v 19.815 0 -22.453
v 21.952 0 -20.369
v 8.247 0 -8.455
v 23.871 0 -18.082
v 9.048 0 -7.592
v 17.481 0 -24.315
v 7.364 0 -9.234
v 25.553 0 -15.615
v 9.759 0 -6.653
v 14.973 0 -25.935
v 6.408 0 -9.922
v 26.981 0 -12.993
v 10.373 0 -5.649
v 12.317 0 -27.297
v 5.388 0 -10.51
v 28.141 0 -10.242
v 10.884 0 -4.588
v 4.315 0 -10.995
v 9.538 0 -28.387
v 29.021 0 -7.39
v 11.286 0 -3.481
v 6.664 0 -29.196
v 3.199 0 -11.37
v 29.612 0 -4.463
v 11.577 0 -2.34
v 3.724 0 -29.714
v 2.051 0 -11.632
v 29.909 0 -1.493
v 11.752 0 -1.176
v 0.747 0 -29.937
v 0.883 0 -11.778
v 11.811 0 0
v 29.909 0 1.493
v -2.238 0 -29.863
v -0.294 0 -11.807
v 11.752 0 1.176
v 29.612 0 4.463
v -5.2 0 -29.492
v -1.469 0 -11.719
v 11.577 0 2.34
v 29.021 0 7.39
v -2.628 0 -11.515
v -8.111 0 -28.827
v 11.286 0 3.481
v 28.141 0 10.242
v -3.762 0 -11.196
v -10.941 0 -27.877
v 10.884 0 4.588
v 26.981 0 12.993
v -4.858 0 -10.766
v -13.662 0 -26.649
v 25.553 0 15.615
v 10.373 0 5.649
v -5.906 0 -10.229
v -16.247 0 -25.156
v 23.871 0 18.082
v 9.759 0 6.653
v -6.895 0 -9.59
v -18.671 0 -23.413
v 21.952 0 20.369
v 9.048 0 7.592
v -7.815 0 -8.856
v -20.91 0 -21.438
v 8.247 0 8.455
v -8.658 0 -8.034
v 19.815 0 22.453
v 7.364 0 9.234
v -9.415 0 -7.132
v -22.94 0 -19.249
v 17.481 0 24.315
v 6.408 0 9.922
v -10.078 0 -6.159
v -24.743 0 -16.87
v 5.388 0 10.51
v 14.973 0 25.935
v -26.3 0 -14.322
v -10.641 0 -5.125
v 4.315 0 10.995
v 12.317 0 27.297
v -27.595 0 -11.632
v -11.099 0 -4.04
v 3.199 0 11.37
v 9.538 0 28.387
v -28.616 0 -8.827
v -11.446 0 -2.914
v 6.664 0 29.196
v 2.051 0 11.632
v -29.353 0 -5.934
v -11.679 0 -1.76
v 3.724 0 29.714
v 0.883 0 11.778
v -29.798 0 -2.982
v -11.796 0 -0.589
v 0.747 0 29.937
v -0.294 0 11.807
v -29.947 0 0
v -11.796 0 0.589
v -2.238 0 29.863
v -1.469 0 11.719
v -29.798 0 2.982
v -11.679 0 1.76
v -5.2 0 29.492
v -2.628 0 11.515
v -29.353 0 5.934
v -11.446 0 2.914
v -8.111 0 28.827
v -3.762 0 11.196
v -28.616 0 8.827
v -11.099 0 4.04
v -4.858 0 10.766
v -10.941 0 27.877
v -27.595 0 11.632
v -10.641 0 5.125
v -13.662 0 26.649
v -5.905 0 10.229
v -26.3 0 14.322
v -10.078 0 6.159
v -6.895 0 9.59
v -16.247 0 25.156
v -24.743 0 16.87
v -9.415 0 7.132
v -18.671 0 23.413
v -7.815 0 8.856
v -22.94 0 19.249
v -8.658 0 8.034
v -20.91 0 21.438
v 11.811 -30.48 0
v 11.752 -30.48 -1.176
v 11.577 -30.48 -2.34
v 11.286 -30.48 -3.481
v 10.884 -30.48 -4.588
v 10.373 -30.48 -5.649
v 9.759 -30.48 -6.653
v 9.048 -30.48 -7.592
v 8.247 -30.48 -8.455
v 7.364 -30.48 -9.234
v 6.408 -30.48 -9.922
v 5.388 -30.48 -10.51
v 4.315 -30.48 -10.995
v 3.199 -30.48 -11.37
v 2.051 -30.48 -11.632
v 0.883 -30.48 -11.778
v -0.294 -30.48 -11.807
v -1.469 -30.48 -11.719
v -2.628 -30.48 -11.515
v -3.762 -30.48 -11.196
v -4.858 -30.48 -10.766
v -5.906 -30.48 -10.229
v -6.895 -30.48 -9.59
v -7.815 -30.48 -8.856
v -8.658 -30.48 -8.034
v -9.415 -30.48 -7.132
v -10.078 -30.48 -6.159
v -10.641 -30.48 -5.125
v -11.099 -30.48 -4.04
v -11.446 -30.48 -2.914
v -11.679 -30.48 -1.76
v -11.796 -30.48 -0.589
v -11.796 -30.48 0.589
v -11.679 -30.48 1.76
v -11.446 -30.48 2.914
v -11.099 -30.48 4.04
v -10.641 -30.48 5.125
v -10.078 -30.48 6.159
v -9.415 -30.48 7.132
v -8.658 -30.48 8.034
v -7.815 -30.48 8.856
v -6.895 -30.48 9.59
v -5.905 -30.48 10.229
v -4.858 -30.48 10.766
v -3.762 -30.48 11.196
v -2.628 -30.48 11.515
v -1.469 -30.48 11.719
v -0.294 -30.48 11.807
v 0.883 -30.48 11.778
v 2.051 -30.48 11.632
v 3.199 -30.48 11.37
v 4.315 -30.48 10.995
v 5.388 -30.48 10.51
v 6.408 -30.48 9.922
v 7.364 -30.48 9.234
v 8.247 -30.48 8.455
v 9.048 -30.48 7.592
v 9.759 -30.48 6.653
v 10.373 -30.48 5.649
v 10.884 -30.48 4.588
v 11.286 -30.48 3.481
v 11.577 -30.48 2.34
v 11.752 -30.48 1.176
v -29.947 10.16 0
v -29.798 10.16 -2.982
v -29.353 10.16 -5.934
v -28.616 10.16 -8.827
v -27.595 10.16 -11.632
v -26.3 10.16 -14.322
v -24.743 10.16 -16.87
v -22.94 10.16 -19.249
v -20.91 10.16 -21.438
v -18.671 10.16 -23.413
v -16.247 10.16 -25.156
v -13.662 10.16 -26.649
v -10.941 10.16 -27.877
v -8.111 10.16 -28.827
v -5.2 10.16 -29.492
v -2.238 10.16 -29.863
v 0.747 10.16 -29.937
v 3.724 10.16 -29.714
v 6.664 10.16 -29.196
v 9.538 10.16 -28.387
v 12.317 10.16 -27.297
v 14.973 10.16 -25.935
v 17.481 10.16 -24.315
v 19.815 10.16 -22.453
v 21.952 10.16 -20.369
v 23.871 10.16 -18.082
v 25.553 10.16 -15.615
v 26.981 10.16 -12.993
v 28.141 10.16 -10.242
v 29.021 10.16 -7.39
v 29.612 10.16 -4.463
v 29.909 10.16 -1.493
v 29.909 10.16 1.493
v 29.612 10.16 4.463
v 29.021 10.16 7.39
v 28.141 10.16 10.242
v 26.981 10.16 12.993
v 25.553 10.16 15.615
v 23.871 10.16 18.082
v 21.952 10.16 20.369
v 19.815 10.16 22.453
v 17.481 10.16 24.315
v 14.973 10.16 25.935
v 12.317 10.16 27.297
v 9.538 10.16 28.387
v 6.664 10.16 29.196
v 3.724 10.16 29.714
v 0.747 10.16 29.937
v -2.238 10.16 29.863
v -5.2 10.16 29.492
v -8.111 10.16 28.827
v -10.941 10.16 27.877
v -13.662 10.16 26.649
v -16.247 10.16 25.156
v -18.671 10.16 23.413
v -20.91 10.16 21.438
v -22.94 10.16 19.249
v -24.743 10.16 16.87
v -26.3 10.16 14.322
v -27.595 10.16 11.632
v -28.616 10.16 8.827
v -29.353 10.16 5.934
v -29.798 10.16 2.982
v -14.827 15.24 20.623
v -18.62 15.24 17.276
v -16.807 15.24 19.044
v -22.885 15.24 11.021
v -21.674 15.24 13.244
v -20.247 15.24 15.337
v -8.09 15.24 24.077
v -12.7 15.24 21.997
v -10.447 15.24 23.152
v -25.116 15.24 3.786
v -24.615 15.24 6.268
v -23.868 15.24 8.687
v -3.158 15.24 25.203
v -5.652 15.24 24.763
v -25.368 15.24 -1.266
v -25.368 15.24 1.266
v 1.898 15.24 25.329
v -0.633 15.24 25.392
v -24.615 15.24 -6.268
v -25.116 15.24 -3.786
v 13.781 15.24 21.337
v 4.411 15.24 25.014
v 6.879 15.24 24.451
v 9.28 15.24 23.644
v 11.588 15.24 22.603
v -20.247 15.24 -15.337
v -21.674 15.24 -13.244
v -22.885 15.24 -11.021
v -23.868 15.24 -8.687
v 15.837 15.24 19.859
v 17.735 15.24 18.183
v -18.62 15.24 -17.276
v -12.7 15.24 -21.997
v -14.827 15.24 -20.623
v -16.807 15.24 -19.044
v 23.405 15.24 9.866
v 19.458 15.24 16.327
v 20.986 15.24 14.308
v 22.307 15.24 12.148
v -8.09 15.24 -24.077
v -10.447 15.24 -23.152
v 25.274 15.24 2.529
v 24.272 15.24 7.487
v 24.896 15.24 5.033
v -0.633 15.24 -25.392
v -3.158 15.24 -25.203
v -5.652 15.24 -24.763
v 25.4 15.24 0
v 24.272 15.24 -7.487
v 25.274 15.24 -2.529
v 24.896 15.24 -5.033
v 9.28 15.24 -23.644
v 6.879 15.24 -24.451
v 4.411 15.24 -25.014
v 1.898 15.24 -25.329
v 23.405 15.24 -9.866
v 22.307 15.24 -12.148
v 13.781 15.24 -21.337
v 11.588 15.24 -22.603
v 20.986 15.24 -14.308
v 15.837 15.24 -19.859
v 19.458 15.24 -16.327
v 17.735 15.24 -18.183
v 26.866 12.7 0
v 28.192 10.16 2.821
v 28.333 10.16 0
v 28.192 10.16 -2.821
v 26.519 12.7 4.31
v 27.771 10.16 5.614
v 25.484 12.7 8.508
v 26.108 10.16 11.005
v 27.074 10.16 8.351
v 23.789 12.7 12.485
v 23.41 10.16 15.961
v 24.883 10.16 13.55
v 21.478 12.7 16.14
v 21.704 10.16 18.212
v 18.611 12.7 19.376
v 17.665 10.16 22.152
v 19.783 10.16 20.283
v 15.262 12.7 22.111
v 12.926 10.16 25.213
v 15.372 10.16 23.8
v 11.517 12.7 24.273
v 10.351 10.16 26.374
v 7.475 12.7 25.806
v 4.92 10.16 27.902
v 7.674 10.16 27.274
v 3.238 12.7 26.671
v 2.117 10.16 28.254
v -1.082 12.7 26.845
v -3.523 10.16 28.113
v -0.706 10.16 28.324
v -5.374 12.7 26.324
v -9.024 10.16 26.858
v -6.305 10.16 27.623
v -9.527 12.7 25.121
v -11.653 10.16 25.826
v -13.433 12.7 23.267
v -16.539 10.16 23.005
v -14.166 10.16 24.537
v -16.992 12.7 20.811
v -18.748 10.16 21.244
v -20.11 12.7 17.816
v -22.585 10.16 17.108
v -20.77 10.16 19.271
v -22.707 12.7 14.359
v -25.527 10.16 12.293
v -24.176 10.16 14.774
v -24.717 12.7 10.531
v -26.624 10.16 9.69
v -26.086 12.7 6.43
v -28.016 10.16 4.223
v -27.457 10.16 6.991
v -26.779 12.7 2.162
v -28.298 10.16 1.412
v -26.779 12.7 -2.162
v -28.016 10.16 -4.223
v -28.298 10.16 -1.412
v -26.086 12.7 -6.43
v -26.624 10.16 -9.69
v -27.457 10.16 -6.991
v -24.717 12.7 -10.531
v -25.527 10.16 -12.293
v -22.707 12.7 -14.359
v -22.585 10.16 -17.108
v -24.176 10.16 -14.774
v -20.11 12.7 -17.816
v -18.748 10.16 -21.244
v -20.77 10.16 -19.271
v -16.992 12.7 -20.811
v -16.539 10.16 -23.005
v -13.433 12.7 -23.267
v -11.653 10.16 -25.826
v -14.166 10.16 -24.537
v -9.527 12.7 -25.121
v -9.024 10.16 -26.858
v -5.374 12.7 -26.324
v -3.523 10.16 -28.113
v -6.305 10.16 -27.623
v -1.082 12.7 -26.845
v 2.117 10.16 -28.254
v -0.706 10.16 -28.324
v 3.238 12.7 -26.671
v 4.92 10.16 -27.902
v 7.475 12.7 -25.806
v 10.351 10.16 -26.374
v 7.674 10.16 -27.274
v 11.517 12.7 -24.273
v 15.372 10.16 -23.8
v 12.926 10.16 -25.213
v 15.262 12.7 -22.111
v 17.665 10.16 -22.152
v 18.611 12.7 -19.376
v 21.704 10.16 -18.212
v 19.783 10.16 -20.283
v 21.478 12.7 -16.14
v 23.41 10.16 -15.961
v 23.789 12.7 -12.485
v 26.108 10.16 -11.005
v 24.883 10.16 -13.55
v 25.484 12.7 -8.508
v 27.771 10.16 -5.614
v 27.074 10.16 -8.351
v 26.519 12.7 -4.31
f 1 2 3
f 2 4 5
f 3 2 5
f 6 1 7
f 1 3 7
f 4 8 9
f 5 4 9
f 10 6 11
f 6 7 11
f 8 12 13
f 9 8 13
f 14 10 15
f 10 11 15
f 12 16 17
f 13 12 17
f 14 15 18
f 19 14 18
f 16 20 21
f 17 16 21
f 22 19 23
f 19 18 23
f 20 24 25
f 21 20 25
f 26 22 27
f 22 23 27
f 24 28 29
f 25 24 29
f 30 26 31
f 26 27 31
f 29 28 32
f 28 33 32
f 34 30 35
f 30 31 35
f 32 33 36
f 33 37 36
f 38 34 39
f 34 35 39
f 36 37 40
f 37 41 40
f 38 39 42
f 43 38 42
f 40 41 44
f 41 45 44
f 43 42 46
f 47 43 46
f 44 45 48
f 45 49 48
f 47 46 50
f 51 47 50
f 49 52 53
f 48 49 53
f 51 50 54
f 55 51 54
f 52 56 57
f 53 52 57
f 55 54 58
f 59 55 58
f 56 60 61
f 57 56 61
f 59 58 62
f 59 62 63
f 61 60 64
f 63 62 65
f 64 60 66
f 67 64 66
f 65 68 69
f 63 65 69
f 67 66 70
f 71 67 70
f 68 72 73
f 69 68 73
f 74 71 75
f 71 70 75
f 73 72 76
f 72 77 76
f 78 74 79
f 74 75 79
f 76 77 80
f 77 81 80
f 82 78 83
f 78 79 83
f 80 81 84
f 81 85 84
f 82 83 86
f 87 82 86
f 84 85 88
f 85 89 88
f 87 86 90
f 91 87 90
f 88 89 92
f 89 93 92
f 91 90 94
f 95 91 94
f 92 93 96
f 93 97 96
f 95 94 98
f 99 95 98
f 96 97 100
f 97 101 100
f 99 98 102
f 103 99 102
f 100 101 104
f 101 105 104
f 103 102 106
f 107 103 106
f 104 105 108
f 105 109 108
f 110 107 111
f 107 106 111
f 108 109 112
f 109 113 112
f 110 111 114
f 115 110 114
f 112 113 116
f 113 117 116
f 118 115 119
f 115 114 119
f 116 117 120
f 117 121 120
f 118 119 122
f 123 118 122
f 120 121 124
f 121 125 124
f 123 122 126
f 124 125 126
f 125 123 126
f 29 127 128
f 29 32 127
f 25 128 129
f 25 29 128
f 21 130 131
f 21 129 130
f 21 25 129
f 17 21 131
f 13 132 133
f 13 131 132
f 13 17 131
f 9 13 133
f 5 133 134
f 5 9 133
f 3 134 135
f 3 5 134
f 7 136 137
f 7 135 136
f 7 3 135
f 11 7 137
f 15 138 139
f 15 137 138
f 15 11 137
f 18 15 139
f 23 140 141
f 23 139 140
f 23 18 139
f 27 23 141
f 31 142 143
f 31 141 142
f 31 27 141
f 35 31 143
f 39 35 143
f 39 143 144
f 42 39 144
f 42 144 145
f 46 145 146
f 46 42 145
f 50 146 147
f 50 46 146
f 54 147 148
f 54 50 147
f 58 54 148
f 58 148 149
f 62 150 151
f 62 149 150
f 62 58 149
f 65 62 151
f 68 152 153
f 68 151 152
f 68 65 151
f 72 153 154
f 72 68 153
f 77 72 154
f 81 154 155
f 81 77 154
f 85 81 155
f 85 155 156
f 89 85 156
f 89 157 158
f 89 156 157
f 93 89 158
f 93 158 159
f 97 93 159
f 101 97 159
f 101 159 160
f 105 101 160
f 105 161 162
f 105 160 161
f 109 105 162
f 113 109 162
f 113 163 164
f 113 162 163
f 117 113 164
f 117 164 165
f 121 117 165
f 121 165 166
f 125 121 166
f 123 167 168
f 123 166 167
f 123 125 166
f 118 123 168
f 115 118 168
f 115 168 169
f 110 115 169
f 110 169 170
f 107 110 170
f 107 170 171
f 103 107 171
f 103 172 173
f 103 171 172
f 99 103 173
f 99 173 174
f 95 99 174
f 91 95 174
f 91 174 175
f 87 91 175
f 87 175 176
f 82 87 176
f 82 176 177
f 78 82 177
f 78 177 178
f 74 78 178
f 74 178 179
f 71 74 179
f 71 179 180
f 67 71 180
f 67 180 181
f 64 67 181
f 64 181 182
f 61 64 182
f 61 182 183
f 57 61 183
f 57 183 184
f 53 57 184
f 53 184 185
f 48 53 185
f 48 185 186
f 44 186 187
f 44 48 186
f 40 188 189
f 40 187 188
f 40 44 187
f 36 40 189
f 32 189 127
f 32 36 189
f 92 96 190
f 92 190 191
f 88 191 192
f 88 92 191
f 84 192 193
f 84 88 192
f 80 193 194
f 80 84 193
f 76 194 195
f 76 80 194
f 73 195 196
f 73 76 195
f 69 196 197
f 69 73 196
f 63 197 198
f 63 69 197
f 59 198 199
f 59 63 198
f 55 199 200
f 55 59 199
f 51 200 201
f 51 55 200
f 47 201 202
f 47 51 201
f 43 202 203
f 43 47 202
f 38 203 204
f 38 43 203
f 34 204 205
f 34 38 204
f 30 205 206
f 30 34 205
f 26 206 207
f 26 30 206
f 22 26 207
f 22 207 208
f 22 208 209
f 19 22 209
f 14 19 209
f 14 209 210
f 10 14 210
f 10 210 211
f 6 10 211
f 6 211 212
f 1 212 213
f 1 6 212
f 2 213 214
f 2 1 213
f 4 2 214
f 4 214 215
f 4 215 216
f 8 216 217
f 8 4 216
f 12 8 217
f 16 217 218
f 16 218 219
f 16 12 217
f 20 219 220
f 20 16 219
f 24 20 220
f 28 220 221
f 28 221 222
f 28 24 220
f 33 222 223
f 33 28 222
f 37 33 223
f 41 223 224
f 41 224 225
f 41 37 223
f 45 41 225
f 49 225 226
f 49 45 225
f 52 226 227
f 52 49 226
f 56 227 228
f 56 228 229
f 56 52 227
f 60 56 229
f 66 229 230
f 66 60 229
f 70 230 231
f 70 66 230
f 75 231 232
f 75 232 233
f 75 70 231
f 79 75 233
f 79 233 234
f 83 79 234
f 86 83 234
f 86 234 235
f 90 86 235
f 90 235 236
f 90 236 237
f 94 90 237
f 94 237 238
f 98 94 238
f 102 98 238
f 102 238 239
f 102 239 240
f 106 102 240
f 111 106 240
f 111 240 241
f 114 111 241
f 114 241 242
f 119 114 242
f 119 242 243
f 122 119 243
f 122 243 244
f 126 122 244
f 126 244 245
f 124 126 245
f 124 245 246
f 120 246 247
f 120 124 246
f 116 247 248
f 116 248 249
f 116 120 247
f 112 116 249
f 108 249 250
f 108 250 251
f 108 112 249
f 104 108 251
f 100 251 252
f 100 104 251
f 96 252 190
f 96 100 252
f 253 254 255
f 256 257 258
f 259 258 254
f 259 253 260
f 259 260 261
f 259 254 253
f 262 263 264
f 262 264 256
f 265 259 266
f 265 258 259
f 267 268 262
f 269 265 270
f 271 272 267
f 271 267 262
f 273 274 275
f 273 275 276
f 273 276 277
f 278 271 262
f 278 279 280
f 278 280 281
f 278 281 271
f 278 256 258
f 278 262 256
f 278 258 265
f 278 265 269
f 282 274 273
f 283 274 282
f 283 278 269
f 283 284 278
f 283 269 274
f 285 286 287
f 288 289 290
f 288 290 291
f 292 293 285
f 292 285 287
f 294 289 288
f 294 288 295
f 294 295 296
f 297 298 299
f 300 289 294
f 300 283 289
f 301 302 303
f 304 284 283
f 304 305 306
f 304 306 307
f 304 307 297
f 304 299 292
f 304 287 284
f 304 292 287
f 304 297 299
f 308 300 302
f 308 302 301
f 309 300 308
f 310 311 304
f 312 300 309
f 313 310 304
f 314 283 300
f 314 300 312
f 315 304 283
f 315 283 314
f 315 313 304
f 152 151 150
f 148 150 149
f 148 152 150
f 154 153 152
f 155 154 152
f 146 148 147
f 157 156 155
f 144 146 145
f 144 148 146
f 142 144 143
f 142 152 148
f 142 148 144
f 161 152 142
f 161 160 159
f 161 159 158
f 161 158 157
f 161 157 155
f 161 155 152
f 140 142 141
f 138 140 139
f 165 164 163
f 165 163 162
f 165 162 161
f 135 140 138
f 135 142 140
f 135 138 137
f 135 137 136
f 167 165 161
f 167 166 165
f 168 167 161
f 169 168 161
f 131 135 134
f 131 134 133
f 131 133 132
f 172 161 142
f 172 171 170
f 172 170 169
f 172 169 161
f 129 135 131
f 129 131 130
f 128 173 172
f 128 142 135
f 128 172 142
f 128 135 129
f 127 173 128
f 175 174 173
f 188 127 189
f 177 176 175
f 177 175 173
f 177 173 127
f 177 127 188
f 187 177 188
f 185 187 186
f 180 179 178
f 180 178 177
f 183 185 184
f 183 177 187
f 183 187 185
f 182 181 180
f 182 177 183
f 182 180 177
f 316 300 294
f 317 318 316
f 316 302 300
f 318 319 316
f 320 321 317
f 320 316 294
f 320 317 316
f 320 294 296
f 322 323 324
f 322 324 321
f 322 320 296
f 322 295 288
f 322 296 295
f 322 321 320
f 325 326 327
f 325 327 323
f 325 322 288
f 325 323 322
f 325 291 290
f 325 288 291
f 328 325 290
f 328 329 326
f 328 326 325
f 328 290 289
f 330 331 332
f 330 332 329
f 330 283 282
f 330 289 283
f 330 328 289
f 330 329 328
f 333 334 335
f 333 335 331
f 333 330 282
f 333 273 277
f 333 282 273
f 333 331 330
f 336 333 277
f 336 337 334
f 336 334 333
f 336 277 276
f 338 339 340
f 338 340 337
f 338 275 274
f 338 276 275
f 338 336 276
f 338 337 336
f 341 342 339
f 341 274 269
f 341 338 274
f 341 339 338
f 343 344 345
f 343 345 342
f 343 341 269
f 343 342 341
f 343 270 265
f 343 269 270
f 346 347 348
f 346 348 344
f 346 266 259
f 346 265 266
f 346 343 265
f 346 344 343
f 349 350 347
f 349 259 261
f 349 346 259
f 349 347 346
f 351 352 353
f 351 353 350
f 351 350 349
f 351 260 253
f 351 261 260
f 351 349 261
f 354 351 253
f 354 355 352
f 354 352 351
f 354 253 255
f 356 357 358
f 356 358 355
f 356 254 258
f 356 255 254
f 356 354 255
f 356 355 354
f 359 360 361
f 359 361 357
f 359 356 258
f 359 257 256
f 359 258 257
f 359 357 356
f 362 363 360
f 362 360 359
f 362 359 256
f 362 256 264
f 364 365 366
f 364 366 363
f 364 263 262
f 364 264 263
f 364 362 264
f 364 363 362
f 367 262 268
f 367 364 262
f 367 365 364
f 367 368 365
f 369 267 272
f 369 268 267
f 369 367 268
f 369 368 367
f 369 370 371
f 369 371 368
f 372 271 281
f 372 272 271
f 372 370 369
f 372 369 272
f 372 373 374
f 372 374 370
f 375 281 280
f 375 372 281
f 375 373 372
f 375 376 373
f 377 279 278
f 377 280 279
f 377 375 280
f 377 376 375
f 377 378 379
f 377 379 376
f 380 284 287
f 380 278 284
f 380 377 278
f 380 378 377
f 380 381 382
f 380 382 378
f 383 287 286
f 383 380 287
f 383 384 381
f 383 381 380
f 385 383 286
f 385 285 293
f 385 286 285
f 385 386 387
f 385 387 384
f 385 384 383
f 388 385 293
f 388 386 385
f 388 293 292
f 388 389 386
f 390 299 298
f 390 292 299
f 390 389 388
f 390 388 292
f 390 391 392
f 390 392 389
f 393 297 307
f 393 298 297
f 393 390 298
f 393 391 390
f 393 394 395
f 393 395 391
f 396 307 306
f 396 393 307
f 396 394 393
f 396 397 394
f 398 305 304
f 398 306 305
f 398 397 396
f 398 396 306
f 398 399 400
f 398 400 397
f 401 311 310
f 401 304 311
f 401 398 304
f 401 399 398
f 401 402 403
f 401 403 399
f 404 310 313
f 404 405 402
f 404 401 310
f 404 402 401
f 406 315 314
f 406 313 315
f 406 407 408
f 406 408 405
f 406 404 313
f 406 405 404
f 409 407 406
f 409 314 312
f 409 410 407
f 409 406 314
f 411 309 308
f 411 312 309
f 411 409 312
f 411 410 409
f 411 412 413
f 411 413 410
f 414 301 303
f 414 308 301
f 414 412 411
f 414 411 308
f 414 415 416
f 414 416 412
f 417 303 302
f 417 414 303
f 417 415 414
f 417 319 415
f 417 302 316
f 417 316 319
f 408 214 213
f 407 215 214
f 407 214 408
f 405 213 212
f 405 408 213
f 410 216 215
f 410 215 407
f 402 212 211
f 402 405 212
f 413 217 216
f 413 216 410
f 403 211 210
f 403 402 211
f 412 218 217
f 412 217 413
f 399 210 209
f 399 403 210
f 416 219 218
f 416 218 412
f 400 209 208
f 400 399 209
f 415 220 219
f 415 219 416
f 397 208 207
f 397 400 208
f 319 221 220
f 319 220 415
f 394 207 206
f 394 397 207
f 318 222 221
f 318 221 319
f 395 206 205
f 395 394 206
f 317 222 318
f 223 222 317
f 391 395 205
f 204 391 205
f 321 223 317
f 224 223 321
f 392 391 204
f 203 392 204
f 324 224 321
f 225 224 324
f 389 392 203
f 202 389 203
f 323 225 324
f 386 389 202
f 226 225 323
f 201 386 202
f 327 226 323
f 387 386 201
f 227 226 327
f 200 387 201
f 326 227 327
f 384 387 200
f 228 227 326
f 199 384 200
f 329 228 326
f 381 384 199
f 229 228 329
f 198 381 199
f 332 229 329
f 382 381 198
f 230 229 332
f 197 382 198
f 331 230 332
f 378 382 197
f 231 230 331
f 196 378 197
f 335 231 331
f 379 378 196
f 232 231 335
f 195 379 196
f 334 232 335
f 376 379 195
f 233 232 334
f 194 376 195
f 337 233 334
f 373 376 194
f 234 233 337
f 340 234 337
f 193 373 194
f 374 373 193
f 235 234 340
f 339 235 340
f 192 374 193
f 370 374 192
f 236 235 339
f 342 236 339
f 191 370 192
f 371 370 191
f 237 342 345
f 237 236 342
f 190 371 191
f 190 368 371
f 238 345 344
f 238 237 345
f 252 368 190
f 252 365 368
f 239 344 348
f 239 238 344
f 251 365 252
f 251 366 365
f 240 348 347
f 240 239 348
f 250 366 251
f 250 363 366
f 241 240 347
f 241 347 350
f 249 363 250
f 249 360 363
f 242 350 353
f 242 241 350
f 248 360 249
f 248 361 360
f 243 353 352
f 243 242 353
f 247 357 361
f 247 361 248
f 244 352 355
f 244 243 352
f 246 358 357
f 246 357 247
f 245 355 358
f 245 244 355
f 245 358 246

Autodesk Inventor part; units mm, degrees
ref_plane "YZ Plane" through (0, 0, 0) normal (1, 0, 0) x (0, 1, 0)
ref_plane "XZ Plane" through (0, 0, 0) normal (0, 1, 0) x (-1, 0, 0)
ref_plane "XY Plane" through (0, 0, 0) normal (0, 0, 1) x (1, 0, 0)
sketch "Sketch1" plane through (0, 0, 0) normal (0, 1, 0) x (-1, 0, 0)
  line L0 (0, -41.9252) -> (0, 41.9252) projected
  line L1 (-41.9252, 0) -> (41.9252, 0) projected
  circle A0 centre (0, 0) radius 29.9466
  dimension "d0" = 59.8932
extrude "Extrusion1" add sketch "Sketch1" along normal blind 10.16
sketch "Sketch2" plane through (0, 0, 0) normal (0, 0, 1) x (1, 0, 0)
  line L0 (-29.9466, 0) -> (29.9466, 0) projected
  line L1 (29.9466, 10.16) -> (-29.9466, 10.16) projected
  line L2 (-29.9466, 0) -> (0, 0)
  line L3 (0, 0) -> (0, 10.16)
  line L4 (0, 10.16) -> (-29.9466, 10.16)
  line L5 (-29.9466, 10.16) -> (-29.9466, 0)
  line L6 (-29.9466, 0) -> (-27.4066, 10.16)
  line L7 (-29.9466, 10.16) -> (-27.4066, 10.16)
  dimension "d4" = 2.54
sketch "Sketch3" plane through (0, 10.16, 0) normal (0, 1, 0) x (1, 0, 0)
  circle A0 centre (0, 0) radius 25.4
  dimension "d8" = 50.8
extrude "Extrusion2" add sketch "Sketch3" along normal blind 5.08
draft "FaceDraft1" angle -30 pull direction (0, -1, 0) faces at (25.3176, 13.5467, 2.0439) fixed edges at (-25.4, 15.24, 0)
sketch "Sketch4" plane through (0, 0, 0) normal (0, -1, 0) x (1, 0, 0)
  circle A0 centre (0, 0) radius 11.811
  dimension "d9" = 23.622
extrude "Extrusion3" add sketch "Sketch4" along normal blind 30.48
properties part number "ButtonLarge"
